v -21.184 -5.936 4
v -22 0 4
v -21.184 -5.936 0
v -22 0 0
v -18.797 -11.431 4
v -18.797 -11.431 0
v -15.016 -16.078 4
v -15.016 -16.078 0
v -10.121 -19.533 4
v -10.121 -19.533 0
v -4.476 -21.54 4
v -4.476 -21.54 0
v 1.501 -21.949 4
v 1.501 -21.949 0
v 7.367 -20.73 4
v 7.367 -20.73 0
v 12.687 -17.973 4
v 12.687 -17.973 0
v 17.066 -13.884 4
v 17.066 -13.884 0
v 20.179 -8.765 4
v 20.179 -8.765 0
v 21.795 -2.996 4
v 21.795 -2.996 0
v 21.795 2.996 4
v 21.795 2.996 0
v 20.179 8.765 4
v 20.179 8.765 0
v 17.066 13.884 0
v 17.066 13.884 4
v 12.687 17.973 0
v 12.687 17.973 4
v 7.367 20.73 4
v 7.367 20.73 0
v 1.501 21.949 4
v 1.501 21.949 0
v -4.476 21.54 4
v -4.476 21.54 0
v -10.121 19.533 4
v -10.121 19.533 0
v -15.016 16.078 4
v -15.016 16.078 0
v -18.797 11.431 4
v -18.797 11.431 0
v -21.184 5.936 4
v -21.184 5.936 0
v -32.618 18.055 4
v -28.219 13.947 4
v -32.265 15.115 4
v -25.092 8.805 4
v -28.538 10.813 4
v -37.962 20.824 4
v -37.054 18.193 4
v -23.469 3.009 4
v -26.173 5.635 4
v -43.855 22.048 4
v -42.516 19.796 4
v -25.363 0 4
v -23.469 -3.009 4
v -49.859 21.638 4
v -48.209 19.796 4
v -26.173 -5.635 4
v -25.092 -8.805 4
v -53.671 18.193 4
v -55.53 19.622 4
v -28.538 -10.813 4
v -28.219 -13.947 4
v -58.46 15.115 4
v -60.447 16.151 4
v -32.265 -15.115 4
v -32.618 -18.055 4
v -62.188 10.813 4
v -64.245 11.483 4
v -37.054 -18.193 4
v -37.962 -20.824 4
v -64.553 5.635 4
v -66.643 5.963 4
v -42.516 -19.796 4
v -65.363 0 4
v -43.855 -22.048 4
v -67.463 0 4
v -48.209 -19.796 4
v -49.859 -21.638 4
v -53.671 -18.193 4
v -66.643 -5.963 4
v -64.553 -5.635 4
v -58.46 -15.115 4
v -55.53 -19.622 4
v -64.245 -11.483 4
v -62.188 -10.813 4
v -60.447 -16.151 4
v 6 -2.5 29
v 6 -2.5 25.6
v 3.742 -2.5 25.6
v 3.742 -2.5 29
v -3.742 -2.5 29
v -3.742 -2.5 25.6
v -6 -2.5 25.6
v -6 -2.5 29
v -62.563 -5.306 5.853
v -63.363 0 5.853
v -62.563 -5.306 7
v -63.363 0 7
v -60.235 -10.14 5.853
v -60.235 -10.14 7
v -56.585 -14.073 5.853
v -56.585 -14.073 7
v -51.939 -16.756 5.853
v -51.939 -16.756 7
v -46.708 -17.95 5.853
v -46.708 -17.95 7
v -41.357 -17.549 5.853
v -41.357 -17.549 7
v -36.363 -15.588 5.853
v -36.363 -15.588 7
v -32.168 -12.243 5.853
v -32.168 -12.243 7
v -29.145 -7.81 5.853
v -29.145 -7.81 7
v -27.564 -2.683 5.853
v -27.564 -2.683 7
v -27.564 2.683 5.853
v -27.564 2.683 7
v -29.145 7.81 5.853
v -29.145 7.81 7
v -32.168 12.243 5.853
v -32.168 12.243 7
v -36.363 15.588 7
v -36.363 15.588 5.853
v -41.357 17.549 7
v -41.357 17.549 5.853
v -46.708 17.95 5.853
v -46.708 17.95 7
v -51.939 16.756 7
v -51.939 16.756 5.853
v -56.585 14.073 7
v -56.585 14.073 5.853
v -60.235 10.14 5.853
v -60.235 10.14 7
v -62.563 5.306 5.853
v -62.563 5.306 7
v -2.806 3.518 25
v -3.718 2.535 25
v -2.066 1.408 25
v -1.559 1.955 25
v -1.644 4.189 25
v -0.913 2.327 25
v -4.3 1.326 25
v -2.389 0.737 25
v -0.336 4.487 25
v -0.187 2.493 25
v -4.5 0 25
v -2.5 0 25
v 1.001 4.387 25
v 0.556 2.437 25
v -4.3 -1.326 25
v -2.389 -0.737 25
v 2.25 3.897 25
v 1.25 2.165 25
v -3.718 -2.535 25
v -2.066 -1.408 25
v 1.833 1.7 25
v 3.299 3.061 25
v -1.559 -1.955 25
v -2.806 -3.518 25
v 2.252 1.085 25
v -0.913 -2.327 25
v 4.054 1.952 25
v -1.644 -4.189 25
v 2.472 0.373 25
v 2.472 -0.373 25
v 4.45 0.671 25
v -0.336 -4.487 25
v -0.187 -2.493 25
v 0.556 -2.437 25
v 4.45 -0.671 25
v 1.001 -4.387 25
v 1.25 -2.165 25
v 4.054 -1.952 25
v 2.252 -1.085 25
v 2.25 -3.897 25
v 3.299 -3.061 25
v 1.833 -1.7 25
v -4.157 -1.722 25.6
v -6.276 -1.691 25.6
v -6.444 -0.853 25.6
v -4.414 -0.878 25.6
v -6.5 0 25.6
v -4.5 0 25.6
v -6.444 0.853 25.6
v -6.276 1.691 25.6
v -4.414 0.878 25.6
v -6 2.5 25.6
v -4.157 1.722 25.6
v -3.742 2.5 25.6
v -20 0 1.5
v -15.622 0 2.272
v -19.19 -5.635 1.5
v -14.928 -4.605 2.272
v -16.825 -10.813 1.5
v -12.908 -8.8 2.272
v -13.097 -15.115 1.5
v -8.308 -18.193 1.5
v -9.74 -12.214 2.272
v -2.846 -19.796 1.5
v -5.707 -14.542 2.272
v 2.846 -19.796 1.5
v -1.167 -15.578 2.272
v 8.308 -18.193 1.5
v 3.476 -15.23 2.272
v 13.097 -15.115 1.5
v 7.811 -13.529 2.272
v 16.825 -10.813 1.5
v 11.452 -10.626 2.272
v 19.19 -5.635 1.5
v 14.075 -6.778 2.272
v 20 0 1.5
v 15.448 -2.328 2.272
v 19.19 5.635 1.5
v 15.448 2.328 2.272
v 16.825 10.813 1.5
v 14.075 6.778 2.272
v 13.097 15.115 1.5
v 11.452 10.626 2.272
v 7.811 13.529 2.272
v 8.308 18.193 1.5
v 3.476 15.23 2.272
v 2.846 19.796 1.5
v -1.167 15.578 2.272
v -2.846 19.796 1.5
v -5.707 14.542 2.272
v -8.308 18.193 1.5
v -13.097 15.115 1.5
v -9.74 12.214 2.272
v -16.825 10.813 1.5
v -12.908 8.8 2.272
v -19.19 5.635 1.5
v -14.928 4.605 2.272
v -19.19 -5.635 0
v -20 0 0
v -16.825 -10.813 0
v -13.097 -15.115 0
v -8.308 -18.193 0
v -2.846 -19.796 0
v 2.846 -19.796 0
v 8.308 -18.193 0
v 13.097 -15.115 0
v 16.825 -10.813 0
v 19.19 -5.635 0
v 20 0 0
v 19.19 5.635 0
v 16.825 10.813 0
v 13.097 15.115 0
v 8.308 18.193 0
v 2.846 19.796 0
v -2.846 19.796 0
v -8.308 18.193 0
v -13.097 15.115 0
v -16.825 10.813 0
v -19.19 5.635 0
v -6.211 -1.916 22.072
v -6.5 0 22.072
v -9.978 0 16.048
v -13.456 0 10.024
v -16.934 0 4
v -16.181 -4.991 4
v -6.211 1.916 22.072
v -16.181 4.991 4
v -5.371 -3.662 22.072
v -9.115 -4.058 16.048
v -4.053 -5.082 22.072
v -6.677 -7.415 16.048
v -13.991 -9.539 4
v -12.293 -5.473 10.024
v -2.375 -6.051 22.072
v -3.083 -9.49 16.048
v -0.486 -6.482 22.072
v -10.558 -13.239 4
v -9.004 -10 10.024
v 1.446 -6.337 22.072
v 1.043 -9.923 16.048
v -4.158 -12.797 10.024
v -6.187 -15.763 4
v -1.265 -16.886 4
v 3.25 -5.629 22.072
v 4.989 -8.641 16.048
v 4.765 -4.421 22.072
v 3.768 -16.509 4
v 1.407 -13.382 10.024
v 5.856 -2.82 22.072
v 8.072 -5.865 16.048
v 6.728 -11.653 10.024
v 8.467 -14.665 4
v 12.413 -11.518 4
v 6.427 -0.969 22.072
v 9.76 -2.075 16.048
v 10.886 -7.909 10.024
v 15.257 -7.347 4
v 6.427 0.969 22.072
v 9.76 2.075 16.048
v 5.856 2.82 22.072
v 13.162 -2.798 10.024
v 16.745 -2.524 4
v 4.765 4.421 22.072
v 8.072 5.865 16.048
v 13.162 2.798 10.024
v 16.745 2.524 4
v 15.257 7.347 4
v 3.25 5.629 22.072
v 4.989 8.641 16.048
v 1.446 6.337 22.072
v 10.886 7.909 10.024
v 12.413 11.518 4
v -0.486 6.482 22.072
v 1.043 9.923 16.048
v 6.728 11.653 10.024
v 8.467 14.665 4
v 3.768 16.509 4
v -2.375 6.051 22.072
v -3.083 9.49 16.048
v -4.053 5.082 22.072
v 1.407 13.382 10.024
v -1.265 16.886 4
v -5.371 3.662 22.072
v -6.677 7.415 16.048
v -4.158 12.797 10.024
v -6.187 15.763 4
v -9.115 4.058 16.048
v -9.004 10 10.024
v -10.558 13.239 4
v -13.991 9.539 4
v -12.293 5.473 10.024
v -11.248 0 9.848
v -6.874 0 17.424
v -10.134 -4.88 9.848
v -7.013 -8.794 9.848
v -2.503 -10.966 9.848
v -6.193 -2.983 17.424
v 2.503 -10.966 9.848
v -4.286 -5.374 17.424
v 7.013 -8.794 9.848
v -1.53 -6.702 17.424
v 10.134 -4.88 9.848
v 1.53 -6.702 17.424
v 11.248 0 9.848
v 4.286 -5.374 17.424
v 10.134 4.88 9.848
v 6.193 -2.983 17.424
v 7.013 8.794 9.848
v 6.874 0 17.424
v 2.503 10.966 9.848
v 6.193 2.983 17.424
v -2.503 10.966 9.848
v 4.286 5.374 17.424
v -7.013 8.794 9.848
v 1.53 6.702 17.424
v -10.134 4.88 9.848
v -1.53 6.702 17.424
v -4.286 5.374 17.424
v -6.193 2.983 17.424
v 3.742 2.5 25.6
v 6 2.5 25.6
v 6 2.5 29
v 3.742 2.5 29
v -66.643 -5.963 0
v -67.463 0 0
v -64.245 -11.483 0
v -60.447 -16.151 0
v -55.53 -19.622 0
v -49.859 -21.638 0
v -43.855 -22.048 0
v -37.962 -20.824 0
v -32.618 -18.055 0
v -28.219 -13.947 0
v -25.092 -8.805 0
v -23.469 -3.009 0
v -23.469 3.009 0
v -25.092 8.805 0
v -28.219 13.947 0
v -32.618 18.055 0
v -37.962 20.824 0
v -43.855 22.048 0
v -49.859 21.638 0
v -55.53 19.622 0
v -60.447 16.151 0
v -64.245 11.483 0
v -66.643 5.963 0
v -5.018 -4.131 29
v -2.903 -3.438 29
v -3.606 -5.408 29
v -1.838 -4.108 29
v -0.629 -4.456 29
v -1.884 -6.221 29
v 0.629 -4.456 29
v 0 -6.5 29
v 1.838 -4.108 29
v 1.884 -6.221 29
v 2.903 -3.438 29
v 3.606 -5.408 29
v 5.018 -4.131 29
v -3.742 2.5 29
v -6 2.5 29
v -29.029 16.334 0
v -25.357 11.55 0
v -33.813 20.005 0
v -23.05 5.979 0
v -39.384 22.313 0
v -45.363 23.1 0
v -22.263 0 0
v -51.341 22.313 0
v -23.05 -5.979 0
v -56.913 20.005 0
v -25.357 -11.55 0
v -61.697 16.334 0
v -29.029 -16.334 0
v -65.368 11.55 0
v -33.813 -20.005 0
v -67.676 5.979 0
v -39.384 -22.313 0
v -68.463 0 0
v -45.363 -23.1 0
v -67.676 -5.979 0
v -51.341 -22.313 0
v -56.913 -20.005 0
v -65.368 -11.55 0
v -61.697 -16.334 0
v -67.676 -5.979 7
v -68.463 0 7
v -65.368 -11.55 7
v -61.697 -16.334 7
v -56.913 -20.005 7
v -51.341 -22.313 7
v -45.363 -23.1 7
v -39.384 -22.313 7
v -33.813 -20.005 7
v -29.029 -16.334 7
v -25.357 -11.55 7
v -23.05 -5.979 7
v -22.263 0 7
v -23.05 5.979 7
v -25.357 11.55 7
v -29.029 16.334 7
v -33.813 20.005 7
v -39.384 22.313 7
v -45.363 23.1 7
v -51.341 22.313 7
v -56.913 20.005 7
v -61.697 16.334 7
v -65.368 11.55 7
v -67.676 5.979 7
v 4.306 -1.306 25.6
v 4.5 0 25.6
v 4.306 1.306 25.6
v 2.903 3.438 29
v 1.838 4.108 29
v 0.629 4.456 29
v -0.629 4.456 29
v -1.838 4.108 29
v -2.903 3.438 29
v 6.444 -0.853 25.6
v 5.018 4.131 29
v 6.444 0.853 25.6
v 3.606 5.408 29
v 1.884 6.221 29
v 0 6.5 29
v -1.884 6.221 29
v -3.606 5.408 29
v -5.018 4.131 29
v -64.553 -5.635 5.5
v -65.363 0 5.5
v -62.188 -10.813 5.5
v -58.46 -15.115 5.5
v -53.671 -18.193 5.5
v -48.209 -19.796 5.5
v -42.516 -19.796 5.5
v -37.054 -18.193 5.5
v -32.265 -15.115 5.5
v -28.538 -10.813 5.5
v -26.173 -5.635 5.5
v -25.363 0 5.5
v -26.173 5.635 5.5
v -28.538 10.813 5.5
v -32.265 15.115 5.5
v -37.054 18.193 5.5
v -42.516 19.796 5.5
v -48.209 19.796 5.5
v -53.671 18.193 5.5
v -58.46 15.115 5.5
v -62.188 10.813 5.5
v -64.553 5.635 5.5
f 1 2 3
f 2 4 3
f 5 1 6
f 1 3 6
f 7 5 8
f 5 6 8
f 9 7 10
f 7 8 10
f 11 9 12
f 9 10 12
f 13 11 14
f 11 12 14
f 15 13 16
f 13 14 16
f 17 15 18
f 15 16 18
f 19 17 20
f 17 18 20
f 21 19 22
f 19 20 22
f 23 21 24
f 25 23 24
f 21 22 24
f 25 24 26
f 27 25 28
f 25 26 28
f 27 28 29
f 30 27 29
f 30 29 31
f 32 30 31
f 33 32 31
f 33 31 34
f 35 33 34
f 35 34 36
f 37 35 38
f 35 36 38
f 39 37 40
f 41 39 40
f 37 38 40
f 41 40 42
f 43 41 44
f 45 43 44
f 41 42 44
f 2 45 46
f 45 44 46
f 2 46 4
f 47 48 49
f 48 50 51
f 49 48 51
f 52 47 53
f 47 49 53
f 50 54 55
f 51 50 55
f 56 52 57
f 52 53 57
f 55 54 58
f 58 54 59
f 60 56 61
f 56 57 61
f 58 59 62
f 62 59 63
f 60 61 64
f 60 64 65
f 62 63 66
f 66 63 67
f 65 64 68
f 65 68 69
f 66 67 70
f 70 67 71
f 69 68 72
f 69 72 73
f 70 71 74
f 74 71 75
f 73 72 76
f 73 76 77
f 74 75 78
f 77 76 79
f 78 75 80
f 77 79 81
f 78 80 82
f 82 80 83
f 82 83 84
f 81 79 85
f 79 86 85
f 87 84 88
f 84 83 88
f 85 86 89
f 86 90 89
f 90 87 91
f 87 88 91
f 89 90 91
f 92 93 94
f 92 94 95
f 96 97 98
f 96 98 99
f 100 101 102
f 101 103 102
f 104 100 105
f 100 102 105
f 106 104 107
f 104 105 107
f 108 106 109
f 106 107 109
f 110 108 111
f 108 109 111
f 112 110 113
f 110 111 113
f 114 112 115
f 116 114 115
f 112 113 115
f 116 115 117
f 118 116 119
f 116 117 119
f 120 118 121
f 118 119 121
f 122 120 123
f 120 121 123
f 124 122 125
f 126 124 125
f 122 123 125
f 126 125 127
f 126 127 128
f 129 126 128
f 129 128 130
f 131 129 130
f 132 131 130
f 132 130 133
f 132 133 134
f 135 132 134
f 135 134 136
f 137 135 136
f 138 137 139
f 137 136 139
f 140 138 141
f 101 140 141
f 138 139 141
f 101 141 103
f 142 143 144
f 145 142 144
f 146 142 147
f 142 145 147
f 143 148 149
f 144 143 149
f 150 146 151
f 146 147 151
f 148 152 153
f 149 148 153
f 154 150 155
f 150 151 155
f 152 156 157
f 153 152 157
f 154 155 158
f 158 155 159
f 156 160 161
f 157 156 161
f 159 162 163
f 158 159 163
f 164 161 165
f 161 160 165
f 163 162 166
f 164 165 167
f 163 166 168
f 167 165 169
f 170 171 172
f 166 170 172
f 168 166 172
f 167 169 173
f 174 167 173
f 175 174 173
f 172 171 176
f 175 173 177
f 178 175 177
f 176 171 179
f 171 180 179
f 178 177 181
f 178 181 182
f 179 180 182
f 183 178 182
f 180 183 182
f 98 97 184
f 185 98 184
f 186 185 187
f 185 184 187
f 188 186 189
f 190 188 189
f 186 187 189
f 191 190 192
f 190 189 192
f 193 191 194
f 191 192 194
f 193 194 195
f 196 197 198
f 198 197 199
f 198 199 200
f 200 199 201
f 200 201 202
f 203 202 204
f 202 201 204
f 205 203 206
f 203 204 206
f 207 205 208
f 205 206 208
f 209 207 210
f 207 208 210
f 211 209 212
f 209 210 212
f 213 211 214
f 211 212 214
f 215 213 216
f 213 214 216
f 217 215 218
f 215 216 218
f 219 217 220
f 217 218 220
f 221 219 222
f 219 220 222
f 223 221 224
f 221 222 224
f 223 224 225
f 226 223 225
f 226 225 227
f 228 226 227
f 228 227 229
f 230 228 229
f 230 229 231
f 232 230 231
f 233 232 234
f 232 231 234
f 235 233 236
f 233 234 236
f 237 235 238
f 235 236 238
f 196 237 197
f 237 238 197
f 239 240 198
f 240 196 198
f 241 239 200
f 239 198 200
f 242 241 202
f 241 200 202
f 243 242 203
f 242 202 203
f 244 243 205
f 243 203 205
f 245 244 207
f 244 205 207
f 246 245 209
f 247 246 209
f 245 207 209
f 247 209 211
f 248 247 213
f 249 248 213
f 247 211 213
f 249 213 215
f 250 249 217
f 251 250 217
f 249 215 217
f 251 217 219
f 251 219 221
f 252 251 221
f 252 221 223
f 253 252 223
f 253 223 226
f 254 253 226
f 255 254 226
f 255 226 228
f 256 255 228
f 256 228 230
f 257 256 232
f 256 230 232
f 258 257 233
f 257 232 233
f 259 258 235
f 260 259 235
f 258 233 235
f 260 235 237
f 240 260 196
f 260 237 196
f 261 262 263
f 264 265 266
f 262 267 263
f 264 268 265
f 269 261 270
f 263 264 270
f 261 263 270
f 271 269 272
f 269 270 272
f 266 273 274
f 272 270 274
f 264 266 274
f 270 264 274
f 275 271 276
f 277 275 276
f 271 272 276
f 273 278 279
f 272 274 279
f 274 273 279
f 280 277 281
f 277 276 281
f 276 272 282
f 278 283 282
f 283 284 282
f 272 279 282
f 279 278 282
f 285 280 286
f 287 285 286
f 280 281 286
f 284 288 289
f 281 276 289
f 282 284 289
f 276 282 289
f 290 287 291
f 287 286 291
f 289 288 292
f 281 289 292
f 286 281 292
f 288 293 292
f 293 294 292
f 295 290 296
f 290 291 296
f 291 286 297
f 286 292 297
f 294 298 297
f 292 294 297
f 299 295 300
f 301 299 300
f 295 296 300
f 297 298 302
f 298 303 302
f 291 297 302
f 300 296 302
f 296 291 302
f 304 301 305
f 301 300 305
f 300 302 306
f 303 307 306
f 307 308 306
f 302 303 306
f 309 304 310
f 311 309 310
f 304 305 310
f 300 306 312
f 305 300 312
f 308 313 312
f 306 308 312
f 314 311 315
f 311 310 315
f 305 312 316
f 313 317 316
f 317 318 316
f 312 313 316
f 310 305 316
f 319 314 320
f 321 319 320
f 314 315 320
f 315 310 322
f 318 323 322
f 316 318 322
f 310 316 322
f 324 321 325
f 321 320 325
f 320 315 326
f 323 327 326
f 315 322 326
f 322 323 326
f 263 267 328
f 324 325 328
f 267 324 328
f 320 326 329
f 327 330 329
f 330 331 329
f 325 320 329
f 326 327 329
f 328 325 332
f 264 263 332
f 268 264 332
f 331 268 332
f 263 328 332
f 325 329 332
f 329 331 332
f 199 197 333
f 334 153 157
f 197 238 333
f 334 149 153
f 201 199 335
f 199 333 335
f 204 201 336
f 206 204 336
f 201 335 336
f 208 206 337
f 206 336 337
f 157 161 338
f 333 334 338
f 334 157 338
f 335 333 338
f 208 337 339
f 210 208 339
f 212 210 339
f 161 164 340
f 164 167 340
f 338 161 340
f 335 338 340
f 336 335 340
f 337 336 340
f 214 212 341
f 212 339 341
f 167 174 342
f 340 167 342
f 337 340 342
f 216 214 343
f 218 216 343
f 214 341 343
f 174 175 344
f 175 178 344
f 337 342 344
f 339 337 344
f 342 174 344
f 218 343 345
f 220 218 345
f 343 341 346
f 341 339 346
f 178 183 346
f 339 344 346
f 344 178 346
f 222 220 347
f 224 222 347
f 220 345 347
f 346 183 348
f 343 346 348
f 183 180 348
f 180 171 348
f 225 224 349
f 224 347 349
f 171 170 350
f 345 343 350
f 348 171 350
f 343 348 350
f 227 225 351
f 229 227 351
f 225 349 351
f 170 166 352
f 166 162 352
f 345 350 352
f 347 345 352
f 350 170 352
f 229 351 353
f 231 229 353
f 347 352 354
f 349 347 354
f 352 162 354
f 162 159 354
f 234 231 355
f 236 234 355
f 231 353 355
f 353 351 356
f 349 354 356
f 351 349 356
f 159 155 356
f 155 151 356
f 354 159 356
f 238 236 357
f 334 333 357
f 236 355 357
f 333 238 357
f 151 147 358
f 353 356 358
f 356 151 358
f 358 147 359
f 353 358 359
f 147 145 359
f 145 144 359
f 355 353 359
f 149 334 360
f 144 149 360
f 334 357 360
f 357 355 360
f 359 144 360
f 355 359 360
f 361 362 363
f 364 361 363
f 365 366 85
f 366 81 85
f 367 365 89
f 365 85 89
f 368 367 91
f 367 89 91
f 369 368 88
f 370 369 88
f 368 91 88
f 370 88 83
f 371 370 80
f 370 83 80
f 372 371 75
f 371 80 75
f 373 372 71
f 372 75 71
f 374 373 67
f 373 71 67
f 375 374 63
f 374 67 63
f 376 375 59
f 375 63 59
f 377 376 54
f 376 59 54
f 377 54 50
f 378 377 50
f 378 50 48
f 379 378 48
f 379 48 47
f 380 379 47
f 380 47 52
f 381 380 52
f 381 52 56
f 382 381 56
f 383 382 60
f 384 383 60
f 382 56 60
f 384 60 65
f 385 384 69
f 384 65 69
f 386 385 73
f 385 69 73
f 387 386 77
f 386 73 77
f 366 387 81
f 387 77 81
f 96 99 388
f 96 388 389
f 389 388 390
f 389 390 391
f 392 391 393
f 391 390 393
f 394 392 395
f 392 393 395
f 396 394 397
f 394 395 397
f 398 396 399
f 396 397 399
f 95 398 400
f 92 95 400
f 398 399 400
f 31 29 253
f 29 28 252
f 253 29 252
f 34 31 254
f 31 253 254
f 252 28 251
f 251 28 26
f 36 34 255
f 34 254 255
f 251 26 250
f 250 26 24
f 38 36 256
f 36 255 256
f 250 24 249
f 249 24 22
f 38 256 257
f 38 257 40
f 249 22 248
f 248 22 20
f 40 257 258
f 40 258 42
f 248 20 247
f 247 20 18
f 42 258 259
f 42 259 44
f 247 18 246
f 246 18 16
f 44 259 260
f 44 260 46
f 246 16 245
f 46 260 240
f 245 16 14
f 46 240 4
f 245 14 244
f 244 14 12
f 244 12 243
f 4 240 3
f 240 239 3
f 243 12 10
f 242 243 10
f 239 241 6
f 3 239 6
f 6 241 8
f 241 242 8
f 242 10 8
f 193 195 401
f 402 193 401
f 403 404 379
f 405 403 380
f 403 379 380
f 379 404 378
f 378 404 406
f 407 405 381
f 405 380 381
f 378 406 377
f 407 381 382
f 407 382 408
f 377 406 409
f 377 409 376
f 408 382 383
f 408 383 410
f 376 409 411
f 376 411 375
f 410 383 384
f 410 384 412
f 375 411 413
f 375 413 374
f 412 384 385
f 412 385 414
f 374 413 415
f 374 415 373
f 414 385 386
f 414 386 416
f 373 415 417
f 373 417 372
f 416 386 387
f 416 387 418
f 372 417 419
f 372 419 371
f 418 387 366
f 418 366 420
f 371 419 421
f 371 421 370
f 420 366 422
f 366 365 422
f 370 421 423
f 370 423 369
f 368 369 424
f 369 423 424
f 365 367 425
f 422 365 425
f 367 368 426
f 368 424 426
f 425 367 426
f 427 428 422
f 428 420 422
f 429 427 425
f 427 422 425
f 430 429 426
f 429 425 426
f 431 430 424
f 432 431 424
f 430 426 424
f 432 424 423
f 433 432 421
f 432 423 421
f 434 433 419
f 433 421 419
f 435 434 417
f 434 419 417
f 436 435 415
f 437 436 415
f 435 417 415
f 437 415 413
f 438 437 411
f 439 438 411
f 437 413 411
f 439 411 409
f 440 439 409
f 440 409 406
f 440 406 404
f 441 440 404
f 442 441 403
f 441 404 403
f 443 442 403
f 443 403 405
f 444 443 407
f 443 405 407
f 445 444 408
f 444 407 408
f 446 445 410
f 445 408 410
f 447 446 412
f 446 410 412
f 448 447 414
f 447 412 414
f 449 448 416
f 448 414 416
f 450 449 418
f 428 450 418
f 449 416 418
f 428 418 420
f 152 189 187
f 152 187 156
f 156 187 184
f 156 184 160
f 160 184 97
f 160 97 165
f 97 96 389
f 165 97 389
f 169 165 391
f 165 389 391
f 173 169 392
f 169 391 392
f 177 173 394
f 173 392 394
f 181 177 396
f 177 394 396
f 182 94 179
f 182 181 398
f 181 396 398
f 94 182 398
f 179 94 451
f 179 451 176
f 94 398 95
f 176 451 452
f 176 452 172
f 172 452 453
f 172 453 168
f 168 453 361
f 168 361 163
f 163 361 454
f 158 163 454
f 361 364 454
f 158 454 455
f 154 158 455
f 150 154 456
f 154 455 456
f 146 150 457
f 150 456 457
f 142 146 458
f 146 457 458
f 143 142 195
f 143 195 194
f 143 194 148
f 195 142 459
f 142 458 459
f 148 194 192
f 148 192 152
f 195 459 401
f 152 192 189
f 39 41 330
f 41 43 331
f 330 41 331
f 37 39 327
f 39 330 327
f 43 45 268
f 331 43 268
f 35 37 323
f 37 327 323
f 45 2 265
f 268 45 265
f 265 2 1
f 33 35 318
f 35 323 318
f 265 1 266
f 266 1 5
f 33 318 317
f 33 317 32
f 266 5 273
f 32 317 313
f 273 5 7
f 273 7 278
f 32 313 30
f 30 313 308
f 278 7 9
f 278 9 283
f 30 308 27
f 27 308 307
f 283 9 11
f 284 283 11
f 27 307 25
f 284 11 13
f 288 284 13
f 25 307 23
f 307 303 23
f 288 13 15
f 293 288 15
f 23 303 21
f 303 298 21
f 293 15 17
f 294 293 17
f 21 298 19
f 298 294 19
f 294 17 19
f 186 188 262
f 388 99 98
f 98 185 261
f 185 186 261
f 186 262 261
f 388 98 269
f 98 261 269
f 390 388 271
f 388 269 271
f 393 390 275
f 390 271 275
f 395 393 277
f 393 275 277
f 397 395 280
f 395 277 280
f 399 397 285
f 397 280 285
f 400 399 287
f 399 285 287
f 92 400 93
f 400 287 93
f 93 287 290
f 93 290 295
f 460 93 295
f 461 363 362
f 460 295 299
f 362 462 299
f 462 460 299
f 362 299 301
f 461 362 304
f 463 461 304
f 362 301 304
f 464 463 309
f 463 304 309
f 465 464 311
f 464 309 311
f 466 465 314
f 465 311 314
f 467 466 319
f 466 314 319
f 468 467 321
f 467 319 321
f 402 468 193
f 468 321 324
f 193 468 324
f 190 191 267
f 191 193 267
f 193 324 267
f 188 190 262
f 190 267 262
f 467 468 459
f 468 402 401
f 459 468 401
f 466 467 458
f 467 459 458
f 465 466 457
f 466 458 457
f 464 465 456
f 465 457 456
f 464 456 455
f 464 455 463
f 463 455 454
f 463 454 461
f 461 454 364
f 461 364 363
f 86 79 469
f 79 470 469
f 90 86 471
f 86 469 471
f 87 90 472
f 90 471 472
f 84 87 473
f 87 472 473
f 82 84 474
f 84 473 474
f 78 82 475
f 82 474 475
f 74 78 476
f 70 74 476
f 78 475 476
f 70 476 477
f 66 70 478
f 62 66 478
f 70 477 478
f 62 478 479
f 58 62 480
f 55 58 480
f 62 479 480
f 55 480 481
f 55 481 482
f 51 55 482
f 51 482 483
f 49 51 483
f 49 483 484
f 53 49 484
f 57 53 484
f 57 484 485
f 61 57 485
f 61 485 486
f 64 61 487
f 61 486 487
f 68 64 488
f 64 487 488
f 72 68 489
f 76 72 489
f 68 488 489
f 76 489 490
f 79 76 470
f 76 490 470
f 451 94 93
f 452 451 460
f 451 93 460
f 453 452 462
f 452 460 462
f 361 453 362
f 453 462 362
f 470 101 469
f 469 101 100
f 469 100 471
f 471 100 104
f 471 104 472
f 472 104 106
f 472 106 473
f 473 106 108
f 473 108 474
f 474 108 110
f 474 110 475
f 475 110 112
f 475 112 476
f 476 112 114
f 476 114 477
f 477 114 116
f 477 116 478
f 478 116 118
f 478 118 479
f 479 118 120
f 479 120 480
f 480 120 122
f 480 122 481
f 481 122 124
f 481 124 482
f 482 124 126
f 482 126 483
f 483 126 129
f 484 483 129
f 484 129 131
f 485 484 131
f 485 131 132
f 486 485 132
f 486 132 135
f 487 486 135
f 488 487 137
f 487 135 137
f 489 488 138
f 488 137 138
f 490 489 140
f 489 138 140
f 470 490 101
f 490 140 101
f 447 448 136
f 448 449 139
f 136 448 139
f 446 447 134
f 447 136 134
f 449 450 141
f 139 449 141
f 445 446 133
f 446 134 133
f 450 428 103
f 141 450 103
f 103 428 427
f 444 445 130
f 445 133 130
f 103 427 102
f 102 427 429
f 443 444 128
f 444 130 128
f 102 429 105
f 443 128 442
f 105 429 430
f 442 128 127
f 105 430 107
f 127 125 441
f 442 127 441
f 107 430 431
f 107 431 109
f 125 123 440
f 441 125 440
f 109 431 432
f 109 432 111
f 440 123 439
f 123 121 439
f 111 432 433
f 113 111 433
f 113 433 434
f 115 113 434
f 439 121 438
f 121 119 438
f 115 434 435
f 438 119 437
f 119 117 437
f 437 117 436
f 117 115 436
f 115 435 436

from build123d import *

# Parameters (mm, degrees)
F2_W     = 5
F2_H     = 8
F3_DEPTH = 7.5


with BuildPart() as f1:
    # F0 (on Front) → F1 (revolve)
    with BuildSketch(Plane.XZ):
        Polygon((-22, 0), (-20, 0), (-20, 1.5), (-15.622045, 2.271952), (-2.5, 25), (-4.5, 25), (-4.5, 29), (-6.5, 29), (-6.5, 22.071797), (-16.933757, 4), (-22, 4), align=None)
    revolve(axis=Axis((0, 0, 15.472903), (0, 0, 1)))

    # F2 (on Right) → F3 (cut, symmetric)
    with BuildSketch(Plane.YZ):
        with Locations((0, 29.6)):
            Rectangle(F2_W, F2_H)
    extrude(amount=F3_DEPTH, both=True, mode=Mode.SUBTRACT)


with BuildPart() as f5:
    # F4 (on Front) → F5 (revolve)
    with BuildSketch(Plane.XZ):
        Polygon((-63.362683, 7), (-68.462683, 7), (-68.462683, 0), (-67.462683, 0), (-67.462683, 4), (-65.362683, 4), (-65.362683, 5.5), (-63.362683, 5.852654), align=None)
    revolve(axis=Axis((-45.362683, 0, 7.750538), (0, 0, 1)))


solid = Compound([f1.part, f5.part])
